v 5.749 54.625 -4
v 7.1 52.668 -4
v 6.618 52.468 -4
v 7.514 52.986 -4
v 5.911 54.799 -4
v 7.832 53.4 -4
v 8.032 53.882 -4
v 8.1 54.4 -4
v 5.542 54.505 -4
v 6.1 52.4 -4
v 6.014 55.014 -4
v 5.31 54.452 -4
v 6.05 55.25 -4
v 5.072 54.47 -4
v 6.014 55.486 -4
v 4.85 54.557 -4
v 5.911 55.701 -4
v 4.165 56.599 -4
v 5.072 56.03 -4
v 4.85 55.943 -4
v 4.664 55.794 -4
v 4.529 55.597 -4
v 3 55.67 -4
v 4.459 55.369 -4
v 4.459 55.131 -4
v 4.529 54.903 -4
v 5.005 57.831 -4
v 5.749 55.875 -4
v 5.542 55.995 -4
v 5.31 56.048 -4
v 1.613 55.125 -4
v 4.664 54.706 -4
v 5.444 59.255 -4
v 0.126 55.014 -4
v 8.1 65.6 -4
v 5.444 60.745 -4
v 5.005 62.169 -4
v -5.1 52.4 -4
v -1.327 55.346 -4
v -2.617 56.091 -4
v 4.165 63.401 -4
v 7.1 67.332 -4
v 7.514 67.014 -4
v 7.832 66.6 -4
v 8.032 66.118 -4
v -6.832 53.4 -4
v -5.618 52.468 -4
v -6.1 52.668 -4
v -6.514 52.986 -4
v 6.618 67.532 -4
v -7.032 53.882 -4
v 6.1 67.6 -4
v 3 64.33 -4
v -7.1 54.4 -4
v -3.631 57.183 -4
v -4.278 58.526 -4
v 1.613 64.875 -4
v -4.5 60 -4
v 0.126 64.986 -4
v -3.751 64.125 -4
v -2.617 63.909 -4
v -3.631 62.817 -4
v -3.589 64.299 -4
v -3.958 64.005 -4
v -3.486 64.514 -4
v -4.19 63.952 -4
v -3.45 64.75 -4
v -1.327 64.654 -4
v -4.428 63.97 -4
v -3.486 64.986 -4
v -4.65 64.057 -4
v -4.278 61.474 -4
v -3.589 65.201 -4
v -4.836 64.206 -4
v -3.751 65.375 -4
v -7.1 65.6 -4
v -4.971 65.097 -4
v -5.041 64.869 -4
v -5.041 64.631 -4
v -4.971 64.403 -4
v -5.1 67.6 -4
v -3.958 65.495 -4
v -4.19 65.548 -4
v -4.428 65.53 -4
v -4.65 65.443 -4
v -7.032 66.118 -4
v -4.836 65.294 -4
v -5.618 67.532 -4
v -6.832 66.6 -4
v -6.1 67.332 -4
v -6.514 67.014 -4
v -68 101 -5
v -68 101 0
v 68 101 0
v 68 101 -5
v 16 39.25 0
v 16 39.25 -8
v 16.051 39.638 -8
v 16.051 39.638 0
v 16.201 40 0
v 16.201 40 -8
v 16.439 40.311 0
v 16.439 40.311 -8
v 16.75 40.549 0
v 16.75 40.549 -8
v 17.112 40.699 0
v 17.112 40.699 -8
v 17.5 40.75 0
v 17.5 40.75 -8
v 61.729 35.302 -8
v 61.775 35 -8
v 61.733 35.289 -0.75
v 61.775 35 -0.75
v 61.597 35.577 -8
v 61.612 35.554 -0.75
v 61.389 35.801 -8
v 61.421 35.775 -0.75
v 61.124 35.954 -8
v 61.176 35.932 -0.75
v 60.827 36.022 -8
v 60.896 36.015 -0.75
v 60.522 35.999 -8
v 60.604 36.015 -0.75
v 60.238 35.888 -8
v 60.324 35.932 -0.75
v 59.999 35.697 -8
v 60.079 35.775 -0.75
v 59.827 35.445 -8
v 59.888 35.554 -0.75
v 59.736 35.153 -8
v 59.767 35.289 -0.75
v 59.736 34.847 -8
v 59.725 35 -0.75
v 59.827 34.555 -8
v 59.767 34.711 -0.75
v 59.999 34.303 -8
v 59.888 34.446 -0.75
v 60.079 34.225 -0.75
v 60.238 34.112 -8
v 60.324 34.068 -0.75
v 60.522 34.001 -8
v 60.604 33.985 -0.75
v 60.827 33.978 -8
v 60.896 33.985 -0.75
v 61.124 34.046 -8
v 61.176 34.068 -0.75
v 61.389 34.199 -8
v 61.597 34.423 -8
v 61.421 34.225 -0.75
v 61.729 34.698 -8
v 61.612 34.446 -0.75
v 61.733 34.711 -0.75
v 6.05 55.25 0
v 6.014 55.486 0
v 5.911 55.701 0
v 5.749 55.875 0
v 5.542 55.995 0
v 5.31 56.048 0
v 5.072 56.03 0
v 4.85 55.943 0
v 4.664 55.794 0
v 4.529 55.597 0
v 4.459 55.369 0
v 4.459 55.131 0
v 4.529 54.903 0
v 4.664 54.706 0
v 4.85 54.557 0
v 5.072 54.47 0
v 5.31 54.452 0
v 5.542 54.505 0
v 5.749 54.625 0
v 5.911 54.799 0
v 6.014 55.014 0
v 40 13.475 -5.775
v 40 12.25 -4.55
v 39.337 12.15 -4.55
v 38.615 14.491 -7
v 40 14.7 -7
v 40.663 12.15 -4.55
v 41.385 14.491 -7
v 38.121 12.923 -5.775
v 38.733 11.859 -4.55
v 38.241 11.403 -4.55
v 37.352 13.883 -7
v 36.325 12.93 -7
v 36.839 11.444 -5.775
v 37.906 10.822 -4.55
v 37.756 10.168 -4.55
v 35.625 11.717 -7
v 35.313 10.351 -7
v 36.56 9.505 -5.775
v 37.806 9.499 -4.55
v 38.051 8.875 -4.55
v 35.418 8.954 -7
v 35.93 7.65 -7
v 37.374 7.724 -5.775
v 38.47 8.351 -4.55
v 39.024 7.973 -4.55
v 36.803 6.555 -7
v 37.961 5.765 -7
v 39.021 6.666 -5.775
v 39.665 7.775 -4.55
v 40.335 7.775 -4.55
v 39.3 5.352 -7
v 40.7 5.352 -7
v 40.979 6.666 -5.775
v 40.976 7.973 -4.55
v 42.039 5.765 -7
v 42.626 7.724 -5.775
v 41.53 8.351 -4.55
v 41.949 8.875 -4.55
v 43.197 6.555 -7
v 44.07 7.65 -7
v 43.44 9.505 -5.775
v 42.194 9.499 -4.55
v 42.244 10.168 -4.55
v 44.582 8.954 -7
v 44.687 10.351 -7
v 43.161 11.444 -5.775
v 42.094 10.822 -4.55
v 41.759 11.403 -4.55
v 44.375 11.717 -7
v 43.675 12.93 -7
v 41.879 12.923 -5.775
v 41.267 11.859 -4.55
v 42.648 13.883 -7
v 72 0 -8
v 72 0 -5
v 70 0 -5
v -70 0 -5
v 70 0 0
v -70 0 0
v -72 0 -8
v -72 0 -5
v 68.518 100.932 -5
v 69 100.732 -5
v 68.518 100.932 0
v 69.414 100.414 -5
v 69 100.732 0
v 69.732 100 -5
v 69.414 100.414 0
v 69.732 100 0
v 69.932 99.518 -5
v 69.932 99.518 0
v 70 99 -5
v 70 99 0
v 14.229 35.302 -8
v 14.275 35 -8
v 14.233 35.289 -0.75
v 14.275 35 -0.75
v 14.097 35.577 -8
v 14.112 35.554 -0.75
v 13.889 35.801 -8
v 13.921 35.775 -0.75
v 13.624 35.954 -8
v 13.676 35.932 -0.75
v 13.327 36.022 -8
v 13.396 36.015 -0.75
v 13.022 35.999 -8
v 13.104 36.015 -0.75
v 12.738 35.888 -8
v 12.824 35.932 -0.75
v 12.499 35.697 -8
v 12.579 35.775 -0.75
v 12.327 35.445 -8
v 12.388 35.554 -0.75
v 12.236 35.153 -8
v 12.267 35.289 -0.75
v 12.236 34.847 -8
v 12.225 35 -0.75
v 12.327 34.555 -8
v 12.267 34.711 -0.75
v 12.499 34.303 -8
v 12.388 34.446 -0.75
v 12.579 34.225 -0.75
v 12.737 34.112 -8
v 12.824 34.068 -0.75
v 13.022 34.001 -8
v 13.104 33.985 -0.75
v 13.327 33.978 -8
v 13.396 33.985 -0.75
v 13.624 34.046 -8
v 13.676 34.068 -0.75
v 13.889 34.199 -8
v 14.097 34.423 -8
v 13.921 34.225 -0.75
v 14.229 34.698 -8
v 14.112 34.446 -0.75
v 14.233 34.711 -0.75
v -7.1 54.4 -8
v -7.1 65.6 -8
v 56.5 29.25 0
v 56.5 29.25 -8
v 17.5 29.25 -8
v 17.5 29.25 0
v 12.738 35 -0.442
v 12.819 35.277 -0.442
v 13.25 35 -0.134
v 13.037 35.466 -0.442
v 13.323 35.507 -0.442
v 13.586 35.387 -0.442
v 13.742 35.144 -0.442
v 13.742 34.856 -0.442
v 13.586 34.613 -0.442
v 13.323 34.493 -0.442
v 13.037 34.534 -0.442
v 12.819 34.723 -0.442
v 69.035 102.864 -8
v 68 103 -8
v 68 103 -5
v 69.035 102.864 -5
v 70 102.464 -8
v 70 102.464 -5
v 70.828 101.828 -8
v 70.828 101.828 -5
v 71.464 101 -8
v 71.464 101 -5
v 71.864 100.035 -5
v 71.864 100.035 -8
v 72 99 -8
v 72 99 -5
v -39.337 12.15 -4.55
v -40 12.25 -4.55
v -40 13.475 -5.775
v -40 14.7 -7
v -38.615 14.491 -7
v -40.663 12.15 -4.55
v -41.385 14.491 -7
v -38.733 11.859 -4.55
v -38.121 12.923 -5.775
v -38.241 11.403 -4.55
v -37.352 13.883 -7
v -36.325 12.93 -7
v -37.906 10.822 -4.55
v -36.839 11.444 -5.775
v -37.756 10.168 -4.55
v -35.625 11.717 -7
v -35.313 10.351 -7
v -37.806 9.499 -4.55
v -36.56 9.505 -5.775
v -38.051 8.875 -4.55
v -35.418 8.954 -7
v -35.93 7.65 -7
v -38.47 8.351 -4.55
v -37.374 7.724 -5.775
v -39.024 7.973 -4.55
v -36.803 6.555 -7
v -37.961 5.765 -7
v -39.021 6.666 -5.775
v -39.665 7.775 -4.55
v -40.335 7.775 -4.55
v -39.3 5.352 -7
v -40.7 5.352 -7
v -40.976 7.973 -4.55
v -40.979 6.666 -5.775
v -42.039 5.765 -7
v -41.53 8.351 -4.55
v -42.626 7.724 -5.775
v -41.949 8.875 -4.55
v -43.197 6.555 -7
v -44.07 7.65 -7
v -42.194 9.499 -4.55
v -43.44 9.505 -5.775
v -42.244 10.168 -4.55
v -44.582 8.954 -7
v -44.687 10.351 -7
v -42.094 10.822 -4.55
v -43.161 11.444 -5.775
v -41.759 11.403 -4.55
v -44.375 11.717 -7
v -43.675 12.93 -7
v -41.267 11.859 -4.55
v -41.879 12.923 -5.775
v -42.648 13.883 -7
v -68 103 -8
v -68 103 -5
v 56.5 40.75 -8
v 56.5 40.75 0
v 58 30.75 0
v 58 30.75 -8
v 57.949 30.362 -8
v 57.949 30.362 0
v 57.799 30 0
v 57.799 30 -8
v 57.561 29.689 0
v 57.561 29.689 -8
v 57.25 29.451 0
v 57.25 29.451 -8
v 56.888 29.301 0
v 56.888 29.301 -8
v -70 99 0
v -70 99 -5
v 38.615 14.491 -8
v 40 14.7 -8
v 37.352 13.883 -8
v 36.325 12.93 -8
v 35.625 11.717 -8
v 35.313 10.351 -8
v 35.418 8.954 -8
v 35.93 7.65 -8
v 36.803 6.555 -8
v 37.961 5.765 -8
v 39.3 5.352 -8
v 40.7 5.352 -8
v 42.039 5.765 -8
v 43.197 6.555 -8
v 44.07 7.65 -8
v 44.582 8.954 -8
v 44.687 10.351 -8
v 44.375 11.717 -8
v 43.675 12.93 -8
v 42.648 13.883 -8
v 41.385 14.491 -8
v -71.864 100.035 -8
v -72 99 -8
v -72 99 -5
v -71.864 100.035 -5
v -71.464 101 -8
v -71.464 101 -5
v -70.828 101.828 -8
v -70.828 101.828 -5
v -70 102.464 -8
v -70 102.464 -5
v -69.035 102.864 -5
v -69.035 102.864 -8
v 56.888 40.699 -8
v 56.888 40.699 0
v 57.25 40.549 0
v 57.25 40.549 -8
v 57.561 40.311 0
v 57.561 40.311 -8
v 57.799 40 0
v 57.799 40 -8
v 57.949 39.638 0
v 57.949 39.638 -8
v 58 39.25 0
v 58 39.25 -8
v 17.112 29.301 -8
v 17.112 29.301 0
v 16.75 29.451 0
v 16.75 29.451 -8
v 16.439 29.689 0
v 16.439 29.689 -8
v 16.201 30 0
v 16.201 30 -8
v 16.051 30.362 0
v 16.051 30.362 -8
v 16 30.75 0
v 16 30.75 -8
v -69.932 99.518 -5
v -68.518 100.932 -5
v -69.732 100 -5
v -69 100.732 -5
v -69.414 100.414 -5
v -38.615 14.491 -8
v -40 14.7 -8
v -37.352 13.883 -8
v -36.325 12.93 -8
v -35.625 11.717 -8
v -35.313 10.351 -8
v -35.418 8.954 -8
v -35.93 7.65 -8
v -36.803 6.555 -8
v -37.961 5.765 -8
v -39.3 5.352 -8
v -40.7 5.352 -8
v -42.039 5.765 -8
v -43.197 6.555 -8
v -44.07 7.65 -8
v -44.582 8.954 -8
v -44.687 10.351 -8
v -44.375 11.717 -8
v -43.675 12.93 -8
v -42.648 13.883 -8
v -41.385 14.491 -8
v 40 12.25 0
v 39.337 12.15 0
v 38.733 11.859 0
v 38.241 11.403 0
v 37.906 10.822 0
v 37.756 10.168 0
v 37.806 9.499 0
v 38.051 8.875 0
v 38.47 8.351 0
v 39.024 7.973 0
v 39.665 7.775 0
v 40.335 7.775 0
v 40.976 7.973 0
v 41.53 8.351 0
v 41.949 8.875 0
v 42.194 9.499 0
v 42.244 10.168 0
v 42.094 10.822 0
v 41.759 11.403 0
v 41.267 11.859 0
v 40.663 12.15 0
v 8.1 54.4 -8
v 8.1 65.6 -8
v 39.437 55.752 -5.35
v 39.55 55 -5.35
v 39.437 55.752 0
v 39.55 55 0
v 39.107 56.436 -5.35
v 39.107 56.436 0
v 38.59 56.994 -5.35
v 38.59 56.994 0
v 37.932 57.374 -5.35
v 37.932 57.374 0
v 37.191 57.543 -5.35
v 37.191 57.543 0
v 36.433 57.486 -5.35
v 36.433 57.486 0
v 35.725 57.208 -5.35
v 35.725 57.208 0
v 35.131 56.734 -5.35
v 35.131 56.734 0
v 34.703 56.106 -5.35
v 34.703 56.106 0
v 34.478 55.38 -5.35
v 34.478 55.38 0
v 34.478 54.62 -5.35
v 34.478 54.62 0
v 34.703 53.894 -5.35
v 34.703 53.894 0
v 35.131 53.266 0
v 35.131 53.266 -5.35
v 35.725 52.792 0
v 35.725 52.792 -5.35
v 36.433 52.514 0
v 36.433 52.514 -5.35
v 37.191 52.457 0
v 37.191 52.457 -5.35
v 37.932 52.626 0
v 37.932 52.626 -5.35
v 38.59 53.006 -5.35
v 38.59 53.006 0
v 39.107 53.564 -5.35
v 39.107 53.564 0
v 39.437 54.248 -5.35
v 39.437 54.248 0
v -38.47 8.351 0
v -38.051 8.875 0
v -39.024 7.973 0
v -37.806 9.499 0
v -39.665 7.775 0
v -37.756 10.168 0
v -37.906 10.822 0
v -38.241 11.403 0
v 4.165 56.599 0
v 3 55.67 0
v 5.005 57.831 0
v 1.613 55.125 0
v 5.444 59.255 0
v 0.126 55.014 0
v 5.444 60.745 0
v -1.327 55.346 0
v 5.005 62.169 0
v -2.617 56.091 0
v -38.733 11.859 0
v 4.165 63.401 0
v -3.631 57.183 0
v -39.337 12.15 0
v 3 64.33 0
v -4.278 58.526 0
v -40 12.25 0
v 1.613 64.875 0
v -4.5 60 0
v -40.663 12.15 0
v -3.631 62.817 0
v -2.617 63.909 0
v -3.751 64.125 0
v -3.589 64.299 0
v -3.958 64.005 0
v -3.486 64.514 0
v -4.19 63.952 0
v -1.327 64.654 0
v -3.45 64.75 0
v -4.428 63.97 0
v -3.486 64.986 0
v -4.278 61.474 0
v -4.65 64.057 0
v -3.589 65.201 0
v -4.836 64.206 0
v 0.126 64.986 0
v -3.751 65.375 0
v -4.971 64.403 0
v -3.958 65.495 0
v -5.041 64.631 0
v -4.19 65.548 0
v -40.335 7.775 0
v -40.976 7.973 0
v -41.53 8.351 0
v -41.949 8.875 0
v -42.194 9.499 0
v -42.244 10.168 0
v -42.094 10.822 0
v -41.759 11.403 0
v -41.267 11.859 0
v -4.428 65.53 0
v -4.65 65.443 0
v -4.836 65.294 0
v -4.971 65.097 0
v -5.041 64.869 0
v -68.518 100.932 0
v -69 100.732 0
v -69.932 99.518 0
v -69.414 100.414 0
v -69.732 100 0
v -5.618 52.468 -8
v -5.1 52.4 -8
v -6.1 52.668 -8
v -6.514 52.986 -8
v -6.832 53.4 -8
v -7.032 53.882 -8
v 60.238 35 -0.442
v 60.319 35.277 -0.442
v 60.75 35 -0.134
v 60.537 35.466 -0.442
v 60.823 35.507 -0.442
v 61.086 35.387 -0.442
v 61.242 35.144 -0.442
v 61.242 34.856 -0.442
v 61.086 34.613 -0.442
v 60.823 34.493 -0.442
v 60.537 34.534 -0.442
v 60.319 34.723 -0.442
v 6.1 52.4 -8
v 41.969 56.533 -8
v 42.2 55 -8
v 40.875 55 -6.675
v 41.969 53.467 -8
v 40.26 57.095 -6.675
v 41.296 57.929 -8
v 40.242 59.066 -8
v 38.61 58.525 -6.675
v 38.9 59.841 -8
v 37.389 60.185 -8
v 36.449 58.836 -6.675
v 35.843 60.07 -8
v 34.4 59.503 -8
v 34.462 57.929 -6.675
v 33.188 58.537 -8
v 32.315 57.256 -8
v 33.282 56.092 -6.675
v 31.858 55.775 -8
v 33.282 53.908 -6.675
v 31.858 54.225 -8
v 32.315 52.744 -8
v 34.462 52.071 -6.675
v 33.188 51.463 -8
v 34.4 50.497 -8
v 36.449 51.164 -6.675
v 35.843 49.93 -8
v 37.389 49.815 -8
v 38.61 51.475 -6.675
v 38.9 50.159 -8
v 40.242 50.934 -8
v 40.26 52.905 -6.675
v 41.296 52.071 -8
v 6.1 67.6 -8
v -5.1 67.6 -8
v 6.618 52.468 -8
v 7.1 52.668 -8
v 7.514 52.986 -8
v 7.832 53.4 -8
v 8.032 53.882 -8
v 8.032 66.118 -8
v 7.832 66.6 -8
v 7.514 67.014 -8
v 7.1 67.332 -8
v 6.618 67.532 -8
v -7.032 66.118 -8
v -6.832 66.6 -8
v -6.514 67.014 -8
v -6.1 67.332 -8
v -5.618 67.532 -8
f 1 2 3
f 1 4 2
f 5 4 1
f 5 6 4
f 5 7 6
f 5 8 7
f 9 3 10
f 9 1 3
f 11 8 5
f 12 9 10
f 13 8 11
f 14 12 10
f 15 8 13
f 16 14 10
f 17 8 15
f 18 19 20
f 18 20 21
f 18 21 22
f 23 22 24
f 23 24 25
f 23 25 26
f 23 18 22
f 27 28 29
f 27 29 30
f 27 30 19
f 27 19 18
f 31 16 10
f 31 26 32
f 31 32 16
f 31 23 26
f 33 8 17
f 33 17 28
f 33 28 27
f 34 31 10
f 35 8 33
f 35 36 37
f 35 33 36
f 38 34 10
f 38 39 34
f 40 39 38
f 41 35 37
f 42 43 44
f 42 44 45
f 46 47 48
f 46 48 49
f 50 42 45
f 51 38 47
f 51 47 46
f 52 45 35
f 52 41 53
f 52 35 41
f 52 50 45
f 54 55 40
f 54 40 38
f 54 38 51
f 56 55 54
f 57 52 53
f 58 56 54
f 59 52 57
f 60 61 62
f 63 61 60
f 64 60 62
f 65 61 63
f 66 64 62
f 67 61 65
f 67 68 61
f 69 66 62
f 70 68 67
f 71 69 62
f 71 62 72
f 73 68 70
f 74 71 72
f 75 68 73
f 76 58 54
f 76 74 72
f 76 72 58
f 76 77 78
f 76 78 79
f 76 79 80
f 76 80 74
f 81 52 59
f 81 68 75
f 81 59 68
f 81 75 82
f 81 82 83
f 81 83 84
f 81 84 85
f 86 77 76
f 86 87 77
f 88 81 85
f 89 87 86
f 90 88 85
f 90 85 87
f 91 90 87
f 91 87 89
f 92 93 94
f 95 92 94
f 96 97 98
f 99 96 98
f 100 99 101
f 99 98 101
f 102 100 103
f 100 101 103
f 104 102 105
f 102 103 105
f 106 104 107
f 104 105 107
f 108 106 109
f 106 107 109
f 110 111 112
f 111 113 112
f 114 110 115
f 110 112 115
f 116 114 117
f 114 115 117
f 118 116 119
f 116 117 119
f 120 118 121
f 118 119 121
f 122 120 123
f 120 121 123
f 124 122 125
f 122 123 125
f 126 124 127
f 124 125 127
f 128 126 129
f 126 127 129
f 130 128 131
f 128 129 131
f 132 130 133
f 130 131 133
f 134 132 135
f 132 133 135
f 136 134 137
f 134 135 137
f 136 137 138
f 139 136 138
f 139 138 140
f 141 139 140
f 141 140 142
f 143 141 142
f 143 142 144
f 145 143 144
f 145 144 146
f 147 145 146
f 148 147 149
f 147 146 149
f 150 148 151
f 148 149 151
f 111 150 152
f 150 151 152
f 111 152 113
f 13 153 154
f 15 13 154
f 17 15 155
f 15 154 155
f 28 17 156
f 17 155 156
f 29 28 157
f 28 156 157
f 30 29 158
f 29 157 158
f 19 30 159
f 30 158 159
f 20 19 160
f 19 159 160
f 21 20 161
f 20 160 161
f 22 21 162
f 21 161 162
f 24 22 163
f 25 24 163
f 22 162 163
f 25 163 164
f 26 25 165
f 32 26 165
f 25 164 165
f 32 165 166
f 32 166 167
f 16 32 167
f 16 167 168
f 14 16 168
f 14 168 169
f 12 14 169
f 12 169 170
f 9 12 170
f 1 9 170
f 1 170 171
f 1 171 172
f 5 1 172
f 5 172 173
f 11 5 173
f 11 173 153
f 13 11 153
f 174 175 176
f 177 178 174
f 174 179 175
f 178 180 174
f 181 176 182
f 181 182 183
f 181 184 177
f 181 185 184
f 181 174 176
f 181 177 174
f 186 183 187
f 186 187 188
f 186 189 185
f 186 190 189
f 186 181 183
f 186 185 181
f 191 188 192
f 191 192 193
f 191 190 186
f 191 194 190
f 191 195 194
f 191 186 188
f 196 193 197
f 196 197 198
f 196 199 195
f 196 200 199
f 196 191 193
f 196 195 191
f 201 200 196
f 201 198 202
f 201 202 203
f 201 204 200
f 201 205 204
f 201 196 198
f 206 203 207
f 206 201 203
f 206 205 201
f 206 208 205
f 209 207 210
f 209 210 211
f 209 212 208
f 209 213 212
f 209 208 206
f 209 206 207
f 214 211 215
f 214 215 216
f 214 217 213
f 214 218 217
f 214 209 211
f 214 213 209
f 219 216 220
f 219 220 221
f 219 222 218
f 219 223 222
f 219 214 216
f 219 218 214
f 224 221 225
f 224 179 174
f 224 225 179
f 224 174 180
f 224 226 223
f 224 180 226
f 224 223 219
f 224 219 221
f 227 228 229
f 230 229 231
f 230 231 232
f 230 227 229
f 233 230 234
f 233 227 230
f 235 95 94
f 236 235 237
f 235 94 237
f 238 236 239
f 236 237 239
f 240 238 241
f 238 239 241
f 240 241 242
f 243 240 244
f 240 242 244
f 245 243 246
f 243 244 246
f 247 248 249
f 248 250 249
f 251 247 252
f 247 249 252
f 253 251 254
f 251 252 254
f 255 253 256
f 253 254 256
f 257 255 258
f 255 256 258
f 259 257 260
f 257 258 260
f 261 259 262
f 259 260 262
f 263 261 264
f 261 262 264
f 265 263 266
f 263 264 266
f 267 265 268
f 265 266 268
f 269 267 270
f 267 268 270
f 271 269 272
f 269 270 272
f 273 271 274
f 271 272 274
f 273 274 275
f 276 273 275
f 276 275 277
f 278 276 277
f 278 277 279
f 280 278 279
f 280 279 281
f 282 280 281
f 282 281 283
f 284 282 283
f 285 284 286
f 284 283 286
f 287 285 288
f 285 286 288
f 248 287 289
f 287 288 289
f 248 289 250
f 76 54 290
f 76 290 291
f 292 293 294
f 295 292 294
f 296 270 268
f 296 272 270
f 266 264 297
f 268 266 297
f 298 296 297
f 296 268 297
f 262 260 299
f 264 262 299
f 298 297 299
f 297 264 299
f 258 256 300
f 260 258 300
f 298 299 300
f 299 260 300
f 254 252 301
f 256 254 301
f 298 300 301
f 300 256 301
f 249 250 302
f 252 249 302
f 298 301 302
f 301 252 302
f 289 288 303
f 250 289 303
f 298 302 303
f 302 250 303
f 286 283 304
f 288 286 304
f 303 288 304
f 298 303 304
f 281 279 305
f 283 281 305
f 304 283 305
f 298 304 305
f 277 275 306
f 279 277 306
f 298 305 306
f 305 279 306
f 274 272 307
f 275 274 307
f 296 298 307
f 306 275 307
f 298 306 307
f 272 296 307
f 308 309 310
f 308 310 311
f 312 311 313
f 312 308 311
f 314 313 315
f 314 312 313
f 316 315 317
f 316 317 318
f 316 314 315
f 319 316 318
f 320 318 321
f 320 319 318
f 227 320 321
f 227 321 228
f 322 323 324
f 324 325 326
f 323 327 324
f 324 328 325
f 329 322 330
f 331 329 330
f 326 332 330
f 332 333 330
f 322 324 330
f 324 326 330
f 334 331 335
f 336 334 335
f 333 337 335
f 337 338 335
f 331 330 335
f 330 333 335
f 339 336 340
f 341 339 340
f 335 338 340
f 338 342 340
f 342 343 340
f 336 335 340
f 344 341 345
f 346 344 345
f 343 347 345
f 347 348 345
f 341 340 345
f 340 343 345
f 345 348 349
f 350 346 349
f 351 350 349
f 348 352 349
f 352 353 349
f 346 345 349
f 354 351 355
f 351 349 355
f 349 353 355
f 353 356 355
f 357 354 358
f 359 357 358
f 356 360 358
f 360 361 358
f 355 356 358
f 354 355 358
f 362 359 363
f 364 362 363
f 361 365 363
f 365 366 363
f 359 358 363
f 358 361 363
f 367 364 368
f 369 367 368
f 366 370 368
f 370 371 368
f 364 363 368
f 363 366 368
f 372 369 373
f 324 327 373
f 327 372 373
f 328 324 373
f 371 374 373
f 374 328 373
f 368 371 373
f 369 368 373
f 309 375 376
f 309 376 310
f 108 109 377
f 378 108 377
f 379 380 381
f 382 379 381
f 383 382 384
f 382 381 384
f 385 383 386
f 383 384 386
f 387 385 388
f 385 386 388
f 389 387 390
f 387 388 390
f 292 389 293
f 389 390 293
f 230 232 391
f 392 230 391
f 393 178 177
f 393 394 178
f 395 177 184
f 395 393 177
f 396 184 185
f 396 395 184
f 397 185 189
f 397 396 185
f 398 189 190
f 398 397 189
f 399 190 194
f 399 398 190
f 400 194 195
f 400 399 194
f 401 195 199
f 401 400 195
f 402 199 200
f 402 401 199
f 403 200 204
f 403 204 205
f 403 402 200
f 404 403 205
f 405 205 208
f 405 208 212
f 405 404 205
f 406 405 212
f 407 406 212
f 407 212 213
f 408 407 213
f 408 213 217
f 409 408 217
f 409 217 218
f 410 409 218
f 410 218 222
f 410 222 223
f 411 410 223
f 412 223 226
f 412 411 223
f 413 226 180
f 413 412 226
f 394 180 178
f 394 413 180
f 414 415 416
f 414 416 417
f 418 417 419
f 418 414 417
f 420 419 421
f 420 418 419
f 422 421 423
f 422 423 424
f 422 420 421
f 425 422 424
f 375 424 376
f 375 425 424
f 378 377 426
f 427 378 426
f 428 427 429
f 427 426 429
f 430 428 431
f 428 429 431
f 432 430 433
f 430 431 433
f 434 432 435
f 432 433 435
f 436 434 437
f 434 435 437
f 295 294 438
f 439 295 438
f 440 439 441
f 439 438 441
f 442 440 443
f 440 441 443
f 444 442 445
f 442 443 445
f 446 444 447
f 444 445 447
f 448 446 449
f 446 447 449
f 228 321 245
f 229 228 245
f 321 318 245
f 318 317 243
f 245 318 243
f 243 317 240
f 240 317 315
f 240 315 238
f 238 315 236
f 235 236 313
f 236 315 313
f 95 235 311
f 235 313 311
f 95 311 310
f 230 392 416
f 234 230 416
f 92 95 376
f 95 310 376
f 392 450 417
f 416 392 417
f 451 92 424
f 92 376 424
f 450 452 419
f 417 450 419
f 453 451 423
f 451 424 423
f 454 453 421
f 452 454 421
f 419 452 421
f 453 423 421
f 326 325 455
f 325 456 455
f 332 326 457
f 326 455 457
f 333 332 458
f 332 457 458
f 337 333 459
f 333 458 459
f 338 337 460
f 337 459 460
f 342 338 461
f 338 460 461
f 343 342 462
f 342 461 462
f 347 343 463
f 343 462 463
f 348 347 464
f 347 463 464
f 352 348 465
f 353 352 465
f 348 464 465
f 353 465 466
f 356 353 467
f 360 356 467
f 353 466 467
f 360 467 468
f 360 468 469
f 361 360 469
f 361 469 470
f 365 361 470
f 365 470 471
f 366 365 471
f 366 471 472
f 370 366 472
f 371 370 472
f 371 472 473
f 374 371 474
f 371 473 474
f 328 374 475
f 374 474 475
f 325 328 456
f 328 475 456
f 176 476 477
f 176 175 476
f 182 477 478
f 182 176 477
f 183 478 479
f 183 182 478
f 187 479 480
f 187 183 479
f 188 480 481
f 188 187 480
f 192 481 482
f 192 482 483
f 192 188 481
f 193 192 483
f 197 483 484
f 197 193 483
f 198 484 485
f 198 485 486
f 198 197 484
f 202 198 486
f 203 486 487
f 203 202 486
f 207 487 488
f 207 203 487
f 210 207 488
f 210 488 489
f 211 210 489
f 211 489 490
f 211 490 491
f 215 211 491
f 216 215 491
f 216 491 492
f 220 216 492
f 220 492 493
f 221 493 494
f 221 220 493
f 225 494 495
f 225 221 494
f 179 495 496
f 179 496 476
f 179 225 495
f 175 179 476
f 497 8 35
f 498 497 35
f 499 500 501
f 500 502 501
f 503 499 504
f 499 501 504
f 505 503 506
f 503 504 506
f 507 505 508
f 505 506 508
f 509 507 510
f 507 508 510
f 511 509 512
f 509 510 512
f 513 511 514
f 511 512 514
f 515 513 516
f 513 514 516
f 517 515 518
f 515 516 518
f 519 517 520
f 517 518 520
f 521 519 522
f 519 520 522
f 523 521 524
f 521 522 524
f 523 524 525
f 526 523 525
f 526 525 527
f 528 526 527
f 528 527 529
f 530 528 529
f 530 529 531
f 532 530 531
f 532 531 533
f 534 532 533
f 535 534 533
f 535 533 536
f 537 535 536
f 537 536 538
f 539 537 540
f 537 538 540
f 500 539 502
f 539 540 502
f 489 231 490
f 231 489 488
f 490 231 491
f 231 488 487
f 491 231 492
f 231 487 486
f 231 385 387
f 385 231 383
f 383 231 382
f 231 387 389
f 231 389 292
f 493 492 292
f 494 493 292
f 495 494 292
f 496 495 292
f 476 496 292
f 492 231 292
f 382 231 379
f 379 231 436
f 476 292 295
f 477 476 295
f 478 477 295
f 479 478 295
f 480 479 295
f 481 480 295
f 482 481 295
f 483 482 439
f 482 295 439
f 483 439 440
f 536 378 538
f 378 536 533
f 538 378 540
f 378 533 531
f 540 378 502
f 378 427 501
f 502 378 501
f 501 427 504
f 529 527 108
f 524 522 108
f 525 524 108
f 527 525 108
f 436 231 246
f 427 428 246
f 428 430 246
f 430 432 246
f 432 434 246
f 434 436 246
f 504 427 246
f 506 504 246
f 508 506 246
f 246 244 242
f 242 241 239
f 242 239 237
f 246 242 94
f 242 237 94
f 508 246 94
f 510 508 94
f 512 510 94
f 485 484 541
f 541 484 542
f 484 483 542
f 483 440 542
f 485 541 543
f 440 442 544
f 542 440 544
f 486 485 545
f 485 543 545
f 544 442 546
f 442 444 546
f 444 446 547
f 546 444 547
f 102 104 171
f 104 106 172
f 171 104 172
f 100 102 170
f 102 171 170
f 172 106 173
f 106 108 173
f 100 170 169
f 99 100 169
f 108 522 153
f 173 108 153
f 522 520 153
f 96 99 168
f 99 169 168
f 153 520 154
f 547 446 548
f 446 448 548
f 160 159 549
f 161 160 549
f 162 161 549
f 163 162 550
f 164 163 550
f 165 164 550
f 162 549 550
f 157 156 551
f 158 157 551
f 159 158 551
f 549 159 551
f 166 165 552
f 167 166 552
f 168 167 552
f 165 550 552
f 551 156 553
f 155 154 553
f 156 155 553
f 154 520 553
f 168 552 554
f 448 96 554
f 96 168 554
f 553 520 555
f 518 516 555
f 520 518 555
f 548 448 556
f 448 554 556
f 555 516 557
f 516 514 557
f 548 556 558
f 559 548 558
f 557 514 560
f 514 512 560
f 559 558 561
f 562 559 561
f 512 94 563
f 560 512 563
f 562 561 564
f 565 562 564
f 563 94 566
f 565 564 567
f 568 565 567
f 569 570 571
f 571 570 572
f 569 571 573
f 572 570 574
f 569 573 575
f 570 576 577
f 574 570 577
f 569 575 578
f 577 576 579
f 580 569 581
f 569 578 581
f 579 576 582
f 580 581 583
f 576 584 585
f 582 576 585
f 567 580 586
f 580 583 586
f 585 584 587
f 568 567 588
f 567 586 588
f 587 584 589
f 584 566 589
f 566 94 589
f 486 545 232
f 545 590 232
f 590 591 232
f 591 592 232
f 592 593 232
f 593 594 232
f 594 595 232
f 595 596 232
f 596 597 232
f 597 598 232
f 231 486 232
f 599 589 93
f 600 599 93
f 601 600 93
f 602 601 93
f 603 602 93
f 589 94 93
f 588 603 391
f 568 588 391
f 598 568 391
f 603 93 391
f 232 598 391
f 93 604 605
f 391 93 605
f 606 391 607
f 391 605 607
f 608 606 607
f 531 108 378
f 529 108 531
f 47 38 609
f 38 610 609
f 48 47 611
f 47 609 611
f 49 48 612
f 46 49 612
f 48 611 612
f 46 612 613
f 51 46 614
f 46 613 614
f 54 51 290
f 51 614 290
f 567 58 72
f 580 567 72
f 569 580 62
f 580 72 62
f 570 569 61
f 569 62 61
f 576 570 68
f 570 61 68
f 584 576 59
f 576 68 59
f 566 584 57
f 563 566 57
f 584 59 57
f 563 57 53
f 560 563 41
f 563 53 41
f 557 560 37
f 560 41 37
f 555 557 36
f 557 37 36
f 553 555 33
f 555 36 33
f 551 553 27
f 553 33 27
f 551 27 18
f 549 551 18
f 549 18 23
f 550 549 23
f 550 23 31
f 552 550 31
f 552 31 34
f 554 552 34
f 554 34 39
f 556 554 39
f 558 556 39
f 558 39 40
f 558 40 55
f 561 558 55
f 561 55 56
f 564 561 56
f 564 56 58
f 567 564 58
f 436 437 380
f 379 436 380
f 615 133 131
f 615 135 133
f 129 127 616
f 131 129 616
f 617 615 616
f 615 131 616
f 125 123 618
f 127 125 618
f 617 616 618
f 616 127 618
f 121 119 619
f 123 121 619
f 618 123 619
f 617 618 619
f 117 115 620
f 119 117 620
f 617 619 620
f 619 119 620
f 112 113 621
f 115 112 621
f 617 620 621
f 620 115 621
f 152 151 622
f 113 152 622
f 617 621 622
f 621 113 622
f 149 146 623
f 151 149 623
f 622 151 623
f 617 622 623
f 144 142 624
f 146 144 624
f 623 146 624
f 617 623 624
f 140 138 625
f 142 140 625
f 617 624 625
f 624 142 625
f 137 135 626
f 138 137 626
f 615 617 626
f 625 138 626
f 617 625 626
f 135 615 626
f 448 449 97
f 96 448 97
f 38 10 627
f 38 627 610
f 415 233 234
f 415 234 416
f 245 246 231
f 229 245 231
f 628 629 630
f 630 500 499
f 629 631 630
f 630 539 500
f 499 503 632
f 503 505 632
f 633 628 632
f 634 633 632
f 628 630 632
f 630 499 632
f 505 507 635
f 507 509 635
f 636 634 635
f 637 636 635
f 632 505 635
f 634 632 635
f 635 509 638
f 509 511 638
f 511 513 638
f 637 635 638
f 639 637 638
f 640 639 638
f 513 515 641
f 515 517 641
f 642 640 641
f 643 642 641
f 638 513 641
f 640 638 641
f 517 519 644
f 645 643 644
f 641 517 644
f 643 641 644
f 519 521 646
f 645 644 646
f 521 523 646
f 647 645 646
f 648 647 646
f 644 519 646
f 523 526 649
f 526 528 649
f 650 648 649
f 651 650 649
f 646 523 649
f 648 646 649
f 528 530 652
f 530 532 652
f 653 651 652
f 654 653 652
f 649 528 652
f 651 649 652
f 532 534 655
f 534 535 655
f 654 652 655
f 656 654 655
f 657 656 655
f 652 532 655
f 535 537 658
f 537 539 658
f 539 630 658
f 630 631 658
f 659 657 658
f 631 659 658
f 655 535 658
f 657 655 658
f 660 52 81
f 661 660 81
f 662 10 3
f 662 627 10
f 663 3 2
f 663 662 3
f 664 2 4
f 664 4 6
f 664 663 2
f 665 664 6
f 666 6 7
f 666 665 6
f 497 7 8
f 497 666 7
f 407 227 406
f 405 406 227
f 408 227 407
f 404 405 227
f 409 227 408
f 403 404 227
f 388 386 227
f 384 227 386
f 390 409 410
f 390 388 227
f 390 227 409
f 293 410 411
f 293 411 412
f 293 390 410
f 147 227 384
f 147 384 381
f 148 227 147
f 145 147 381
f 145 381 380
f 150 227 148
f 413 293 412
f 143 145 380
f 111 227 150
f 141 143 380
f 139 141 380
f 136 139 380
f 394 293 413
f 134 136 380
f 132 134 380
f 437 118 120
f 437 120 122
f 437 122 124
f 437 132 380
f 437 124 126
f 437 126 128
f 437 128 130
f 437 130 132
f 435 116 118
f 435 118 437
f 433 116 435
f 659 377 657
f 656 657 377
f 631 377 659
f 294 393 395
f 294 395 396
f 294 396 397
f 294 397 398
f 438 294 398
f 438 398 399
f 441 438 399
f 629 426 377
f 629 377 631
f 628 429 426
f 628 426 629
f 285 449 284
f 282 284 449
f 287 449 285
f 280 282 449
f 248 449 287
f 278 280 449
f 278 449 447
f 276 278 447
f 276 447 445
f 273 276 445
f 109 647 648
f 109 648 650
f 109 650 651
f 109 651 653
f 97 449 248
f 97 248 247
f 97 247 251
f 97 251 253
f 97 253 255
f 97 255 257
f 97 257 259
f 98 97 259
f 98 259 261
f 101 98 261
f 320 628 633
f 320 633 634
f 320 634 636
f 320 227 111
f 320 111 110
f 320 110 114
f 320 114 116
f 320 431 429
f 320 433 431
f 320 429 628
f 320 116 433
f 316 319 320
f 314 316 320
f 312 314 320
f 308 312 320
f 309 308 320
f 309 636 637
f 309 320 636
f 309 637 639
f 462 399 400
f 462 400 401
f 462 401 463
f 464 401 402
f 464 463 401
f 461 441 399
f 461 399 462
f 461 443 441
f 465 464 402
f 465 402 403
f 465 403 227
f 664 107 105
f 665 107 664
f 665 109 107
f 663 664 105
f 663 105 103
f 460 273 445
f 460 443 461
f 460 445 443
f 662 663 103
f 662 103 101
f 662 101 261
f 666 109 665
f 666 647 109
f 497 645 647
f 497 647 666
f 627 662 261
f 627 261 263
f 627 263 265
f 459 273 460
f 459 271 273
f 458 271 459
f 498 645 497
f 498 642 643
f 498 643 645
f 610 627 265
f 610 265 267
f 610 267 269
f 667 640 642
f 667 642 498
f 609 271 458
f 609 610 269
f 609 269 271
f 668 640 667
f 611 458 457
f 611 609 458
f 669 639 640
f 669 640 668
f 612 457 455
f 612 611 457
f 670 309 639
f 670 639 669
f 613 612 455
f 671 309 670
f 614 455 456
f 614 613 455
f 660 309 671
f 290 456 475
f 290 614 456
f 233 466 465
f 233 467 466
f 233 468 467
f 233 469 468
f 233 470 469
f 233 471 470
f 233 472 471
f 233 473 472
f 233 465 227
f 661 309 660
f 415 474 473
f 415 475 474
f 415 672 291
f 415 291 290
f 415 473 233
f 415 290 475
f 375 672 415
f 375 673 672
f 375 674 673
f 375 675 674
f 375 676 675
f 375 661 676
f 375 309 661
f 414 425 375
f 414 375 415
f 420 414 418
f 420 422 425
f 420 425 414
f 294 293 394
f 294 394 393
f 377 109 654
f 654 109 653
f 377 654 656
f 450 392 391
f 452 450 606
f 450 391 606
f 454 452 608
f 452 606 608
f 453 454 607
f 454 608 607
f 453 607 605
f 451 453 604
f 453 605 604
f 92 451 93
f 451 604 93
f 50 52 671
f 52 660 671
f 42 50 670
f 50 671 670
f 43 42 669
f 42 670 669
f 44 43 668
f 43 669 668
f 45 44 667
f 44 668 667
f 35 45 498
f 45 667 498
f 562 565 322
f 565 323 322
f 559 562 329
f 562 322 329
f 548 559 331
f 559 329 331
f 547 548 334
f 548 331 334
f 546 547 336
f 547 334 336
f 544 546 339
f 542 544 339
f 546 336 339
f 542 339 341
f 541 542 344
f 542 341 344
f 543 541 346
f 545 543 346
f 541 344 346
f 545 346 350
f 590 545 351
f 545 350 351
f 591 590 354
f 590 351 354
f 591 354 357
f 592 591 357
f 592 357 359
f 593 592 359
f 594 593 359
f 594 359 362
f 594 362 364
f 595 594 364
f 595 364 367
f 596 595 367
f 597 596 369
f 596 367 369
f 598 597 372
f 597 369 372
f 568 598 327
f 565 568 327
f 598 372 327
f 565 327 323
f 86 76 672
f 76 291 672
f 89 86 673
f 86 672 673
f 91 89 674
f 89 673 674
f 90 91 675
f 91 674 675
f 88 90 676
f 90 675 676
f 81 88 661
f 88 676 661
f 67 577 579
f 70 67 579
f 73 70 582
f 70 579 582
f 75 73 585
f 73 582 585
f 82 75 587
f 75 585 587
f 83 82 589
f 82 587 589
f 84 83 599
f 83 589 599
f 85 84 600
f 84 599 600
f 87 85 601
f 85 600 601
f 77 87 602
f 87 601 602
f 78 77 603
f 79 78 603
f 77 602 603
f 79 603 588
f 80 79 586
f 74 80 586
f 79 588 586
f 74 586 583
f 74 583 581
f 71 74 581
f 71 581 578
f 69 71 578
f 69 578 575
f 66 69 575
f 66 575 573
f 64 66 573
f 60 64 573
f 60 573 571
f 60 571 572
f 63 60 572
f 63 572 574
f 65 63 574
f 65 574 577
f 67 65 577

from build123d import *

# Parameters (mm, degrees)
BOSS_EXTRUDE1_DEPTH                                 = 8
BOSS_EXTRUDE2_DEPTH                                 = 3
CUT_EXTRUDE1_START                                  = -4
SKETCH13_W                                          = 15.2
SKETCH13_H                                          = 15.2
CUT_EXTRUDE1_DEPTH                                  = 4
FILLET1_R                                           = 2
SKETCH14_R                                          = 5
CUT_EXTRUDE4_DEPTH                                  = 126.924580603
M2_TAPPED_HOLE1_D                                   = 1.6
CUT_EXTRUDE5_DEPTH                                  = 126.924580603
M2_5_TAPPED_HOLE1_D                                 = 2.05
M2_5_TAPPED_HOLE1_DEPTH                             = 7.25
M2_5_TAPPED_HOLE1_TIP                               = 0.615882135
CSK_FOR_M5_COUNTERSUNK_FLAT_HEAD_SCREW1_D           = 5.1
CSK_FOR_M5_COUNTERSUNK_FLAT_HEAD_SCREW1_CSINK_D     = 10.4
CSK_FOR_M5_COUNTERSUNK_FLAT_HEAD_SCREW1_CSINK_ANGLE = 90


with BuildPart() as part:
    # Sketch3 → Boss-Extrude1 (new body)
    with BuildSketch(Plane(origin=(0, 0, 0), x_dir=(-1, 0, 0), z_dir=(0, 0, -1))):
        with BuildLine():
            Line((-70, 0), (70, 0))
            Line((70, 0), (70, 99))
            ThreePointArc((70, 99), (69.414213562, 100.414213562), (68, 101))
            Line((68, 101), (-68, 101))
            ThreePointArc((-68, 101), (-69.414213562, 100.414213562), (-70, 99))
            Line((-70, 99), (-70, 0))
        make_face()
    extrude(amount=BOSS_EXTRUDE1_DEPTH)

    # Sketch4 → Boss-Extrude2 (add)
    with BuildSketch(Plane(origin=(0, 0, -8), x_dir=(-1, 0, 0), z_dir=(0, 0, -1))):
        with BuildLine():
            Line((-72, 0), (72, 0))
            Line((72, 0), (72, 99))
            ThreePointArc((72, 99), (70.828427125, 101.828427125), (68, 103))
            Line((68, 103), (-68, 103))
            ThreePointArc((-68, 103), (-70.828427125, 101.828427125), (-72, 99))
            Line((-72, 99), (-72, 0))
        make_face()
    extrude(amount=-BOSS_EXTRUDE2_DEPTH)

    # Sketch5 → CSK for M4 Countersunk Flat Head Screw1 (revolve, cut)
    with BuildSketch(Plane(origin=(40, 10, -8), x_dir=(0, 1, 0), z_dir=(1, 0, 0))):
        Polygon((0, 0), (0, 8), (2.25, 8), (2.25, 3.45), (4.7, 1), (4.7, 0), align=None)
    csk_for_m4_countersunk_flat_head_screw1 = revolve(axis=Axis((40, 10, -14.35), (0, 0, 1)), mode=Mode.SUBTRACT)

    # Mirror1: CSK for M4 Countersunk Flat Head Screw1 across plane
    add(csk_for_m4_countersunk_flat_head_screw1.mirror(Plane(origin=(0, 0, 0), x_dir=(0, 0, 1), z_dir=(1, 0, 0))), mode=Mode.SUBTRACT)

    # Sketch13 → Cut-Extrude1 (cut)
    with BuildSketch(Plane(origin=(0, 0, -8), x_dir=(-1, 0, 0), z_dir=(0, 0, -1)).offset(CUT_EXTRUDE1_START)):
        with Locations((-0.5, 60)):
            Rectangle(SKETCH13_W, SKETCH13_H)
    extrude(amount=CUT_EXTRUDE1_DEPTH, mode=Mode.SUBTRACT)

    # Fillet1
    fillet1_edges = [part.edges().sort_by_distance(p)[0] for p in [
        (8.1, 67.6, -6),
        (8.1, 52.4, -6),
        (-7.1, 52.4, -6),
        (-7.1, 67.6, -6),
    ]]
    fillet(fillet1_edges, radius=FILLET1_R)

    # Sketch14 → Cut-Extrude4 (cut, through all)
    with BuildSketch(Plane(origin=(0, 0, -8), x_dir=(-1, 0, 0), z_dir=(0, 0, -1))):
        with Locations((-0.5, 60)):
            Circle(SKETCH14_R)
    extrude(amount=-CUT_EXTRUDE4_DEPTH, mode=Mode.SUBTRACT)

    # M2 Tapped Hole1 (through all)
    with Locations(Plane(origin=(0, 0, -4), x_dir=(-1, 0, 0), z_dir=(0, 0, -1))):
        with Locations((4.25, 64.75), (-5.25, 55.25)):
            Hole(M2_TAPPED_HOLE1_D / 2)

    # DB conn slot → Cut-Extrude5 (cut, through all)
    with BuildSketch(Plane(origin=(0, 0, -8), x_dir=(-1, 0, 0), z_dir=(0, 0, -1))):
        with BuildLine():
            Line((-56.5, 29.25), (-17.5, 29.25))
            ThreePointArc((-17.5, 29.25), (-16.439339828, 29.689339828), (-16, 30.75))
            Line((-16, 30.75), (-16, 39.25))
            ThreePointArc((-16, 39.25), (-16.439339828, 40.310660172), (-17.5, 40.75))
            Line((-17.5, 40.75), (-56.5, 40.75))
            ThreePointArc((-56.5, 40.75), (-57.560660172, 40.310660172), (-58, 39.25))
            Line((-58, 39.25), (-58, 30.75))
            ThreePointArc((-58, 30.75), (-57.560660172, 29.689339828), (-56.5, 29.25))
        make_face()
    extrude(amount=-CUT_EXTRUDE5_DEPTH, mode=Mode.SUBTRACT)

    # M2.5 Tapped Hole1
    with Locations(Plane(origin=(0, 0, -8), x_dir=(-1, 0, 0), z_dir=(0, 0, -1))):
        with Locations((-60.75, 35), (-13.25, 35)):
            Hole(M2_5_TAPPED_HOLE1_D / 2, depth=M2_5_TAPPED_HOLE1_DEPTH)
            with Locations((0, 0, -(M2_5_TAPPED_HOLE1_DEPTH + M2_5_TAPPED_HOLE1_TIP / 2))):  # 118° drill point
                Cone(0, M2_5_TAPPED_HOLE1_D / 2, M2_5_TAPPED_HOLE1_TIP, mode=Mode.SUBTRACT)

    # CSK for M5 Countersunk Flat Head Screw1 (through all)
    with Locations(Plane(origin=(0, 0, -8), x_dir=(-1, 0, 0), z_dir=(0, 0, -1))):
        with Locations((-37, 55)):
            CounterSinkHole(CSK_FOR_M5_COUNTERSUNK_FLAT_HEAD_SCREW1_D / 2, CSK_FOR_M5_COUNTERSUNK_FLAT_HEAD_SCREW1_CSINK_D / 2, counter_sink_angle=CSK_FOR_M5_COUNTERSUNK_FLAT_HEAD_SCREW1_CSINK_ANGLE)


solid = part.part
